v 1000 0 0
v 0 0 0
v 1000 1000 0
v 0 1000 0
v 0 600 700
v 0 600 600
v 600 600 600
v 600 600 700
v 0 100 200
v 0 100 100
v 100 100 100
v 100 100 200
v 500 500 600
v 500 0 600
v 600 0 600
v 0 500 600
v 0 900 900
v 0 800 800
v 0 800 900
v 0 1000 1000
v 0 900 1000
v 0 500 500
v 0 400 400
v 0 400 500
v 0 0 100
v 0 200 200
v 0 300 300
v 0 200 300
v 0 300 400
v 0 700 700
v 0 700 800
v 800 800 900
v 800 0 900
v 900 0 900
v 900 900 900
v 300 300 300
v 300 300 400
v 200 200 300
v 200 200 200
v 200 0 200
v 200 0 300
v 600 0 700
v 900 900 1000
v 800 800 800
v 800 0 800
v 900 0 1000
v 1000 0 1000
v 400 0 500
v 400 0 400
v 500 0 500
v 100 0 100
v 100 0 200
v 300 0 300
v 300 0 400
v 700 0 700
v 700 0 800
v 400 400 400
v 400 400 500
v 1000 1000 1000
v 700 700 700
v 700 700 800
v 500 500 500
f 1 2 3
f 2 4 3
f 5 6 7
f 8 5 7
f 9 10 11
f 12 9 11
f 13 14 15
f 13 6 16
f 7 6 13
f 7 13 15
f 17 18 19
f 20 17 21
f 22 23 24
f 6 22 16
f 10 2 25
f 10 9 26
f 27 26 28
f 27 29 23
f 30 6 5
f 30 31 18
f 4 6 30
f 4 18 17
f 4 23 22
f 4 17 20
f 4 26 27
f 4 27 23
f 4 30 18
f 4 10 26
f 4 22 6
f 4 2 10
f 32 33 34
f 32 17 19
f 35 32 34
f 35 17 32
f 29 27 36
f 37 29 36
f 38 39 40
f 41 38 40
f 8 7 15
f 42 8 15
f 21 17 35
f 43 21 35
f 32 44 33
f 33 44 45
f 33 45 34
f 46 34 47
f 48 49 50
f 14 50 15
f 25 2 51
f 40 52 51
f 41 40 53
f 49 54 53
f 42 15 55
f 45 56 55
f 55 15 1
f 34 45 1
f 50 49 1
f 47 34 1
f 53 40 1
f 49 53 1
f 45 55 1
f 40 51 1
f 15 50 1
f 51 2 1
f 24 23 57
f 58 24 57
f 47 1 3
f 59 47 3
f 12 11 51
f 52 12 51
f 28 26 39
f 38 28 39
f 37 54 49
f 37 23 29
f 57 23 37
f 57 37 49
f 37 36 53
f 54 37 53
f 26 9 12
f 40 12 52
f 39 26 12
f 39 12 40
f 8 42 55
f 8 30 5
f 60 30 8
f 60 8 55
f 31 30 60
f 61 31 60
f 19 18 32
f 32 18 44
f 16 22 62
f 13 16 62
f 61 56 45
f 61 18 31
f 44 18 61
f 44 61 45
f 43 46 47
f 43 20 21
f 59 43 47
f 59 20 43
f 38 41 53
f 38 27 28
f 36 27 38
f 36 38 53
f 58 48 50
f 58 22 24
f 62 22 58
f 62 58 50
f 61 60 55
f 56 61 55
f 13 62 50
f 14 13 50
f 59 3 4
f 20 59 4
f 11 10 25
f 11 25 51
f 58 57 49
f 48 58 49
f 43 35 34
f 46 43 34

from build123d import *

# Parameters (mm, degrees)
F1_DEPTH  = 1000
F2_DEPTH  = 900
F3_DEPTH  = 800
F4_DEPTH  = 700
F5_DEPTH  = 600
F6_DEPTH  = 500
F7_DEPTH  = 400
F8_DEPTH  = 300
F9_DEPTH  = 200
F0_W      = 100
F0_H      = 100
F10_DEPTH = 100


with BuildPart() as f1:
    # F0 (on Top) → F1 (new body)
    with BuildSketch(Plane.XY):
        Polygon((900, 900), (900, 0), (1000, 0), (1000, 1000), (0, 1000), (0, 900), align=None)
    extrude(amount=F1_DEPTH)

    # F0 (on Top) → F2 (join)
    with BuildSketch(Plane.XY):
        Polygon((800, 800), (800, 0), (900, 0), (900, 900), (0, 900), (0, 800), align=None)
    extrude(amount=F2_DEPTH)

    # F0 (on Top) → F3 (join)
    with BuildSketch(Plane.XY):
        Polygon((700, 700), (700, 0), (800, 0), (800, 800), (0, 800), (0, 700), align=None)
    extrude(amount=F3_DEPTH)

    # F0 (on Top) → F4 (join)
    with BuildSketch(Plane.XY):
        Polygon((600, 600), (600, 0), (700, 0), (700, 700), (0, 700), (0, 600), align=None)
    extrude(amount=F4_DEPTH)

    # F0 (on Top) → F5 (join)
    with BuildSketch(Plane.XY):
        Polygon((500, 500), (500, 0), (600, 0), (600, 600), (0, 600), (0, 500), align=None)
    extrude(amount=F5_DEPTH)

    # F0 (on Top) → F6 (join)
    with BuildSketch(Plane.XY):
        Polygon((400, 400), (400, 0), (500, 0), (500, 500), (0, 500), (0, 400), align=None)
    extrude(amount=F6_DEPTH)

    # F0 (on Top) → F7 (join)
    with BuildSketch(Plane.XY):
        Polygon((300, 300), (300, 0), (400, 0), (400, 400), (0, 400), (0, 300), align=None)
    extrude(amount=F7_DEPTH)

    # F0 (on Top) → F8 (join)
    with BuildSketch(Plane.XY):
        Polygon((200, 200), (200, 0), (300, 0), (300, 300), (0, 300), (0, 200), align=None)
    extrude(amount=F8_DEPTH)

    # F0 (on Top) → F9 (join)
    with BuildSketch(Plane.XY):
        Polygon((100, 100), (100, 0), (200, 0), (200, 200), (0, 200), (0, 100), align=None)
    extrude(amount=F9_DEPTH)

    # F0 (on Top) → F10 (join)
    with BuildSketch(Plane.XY):
        with Locations((50, 50)):
            Rectangle(F0_W, F0_H)
    extrude(amount=F10_DEPTH)


solid = f1.part
